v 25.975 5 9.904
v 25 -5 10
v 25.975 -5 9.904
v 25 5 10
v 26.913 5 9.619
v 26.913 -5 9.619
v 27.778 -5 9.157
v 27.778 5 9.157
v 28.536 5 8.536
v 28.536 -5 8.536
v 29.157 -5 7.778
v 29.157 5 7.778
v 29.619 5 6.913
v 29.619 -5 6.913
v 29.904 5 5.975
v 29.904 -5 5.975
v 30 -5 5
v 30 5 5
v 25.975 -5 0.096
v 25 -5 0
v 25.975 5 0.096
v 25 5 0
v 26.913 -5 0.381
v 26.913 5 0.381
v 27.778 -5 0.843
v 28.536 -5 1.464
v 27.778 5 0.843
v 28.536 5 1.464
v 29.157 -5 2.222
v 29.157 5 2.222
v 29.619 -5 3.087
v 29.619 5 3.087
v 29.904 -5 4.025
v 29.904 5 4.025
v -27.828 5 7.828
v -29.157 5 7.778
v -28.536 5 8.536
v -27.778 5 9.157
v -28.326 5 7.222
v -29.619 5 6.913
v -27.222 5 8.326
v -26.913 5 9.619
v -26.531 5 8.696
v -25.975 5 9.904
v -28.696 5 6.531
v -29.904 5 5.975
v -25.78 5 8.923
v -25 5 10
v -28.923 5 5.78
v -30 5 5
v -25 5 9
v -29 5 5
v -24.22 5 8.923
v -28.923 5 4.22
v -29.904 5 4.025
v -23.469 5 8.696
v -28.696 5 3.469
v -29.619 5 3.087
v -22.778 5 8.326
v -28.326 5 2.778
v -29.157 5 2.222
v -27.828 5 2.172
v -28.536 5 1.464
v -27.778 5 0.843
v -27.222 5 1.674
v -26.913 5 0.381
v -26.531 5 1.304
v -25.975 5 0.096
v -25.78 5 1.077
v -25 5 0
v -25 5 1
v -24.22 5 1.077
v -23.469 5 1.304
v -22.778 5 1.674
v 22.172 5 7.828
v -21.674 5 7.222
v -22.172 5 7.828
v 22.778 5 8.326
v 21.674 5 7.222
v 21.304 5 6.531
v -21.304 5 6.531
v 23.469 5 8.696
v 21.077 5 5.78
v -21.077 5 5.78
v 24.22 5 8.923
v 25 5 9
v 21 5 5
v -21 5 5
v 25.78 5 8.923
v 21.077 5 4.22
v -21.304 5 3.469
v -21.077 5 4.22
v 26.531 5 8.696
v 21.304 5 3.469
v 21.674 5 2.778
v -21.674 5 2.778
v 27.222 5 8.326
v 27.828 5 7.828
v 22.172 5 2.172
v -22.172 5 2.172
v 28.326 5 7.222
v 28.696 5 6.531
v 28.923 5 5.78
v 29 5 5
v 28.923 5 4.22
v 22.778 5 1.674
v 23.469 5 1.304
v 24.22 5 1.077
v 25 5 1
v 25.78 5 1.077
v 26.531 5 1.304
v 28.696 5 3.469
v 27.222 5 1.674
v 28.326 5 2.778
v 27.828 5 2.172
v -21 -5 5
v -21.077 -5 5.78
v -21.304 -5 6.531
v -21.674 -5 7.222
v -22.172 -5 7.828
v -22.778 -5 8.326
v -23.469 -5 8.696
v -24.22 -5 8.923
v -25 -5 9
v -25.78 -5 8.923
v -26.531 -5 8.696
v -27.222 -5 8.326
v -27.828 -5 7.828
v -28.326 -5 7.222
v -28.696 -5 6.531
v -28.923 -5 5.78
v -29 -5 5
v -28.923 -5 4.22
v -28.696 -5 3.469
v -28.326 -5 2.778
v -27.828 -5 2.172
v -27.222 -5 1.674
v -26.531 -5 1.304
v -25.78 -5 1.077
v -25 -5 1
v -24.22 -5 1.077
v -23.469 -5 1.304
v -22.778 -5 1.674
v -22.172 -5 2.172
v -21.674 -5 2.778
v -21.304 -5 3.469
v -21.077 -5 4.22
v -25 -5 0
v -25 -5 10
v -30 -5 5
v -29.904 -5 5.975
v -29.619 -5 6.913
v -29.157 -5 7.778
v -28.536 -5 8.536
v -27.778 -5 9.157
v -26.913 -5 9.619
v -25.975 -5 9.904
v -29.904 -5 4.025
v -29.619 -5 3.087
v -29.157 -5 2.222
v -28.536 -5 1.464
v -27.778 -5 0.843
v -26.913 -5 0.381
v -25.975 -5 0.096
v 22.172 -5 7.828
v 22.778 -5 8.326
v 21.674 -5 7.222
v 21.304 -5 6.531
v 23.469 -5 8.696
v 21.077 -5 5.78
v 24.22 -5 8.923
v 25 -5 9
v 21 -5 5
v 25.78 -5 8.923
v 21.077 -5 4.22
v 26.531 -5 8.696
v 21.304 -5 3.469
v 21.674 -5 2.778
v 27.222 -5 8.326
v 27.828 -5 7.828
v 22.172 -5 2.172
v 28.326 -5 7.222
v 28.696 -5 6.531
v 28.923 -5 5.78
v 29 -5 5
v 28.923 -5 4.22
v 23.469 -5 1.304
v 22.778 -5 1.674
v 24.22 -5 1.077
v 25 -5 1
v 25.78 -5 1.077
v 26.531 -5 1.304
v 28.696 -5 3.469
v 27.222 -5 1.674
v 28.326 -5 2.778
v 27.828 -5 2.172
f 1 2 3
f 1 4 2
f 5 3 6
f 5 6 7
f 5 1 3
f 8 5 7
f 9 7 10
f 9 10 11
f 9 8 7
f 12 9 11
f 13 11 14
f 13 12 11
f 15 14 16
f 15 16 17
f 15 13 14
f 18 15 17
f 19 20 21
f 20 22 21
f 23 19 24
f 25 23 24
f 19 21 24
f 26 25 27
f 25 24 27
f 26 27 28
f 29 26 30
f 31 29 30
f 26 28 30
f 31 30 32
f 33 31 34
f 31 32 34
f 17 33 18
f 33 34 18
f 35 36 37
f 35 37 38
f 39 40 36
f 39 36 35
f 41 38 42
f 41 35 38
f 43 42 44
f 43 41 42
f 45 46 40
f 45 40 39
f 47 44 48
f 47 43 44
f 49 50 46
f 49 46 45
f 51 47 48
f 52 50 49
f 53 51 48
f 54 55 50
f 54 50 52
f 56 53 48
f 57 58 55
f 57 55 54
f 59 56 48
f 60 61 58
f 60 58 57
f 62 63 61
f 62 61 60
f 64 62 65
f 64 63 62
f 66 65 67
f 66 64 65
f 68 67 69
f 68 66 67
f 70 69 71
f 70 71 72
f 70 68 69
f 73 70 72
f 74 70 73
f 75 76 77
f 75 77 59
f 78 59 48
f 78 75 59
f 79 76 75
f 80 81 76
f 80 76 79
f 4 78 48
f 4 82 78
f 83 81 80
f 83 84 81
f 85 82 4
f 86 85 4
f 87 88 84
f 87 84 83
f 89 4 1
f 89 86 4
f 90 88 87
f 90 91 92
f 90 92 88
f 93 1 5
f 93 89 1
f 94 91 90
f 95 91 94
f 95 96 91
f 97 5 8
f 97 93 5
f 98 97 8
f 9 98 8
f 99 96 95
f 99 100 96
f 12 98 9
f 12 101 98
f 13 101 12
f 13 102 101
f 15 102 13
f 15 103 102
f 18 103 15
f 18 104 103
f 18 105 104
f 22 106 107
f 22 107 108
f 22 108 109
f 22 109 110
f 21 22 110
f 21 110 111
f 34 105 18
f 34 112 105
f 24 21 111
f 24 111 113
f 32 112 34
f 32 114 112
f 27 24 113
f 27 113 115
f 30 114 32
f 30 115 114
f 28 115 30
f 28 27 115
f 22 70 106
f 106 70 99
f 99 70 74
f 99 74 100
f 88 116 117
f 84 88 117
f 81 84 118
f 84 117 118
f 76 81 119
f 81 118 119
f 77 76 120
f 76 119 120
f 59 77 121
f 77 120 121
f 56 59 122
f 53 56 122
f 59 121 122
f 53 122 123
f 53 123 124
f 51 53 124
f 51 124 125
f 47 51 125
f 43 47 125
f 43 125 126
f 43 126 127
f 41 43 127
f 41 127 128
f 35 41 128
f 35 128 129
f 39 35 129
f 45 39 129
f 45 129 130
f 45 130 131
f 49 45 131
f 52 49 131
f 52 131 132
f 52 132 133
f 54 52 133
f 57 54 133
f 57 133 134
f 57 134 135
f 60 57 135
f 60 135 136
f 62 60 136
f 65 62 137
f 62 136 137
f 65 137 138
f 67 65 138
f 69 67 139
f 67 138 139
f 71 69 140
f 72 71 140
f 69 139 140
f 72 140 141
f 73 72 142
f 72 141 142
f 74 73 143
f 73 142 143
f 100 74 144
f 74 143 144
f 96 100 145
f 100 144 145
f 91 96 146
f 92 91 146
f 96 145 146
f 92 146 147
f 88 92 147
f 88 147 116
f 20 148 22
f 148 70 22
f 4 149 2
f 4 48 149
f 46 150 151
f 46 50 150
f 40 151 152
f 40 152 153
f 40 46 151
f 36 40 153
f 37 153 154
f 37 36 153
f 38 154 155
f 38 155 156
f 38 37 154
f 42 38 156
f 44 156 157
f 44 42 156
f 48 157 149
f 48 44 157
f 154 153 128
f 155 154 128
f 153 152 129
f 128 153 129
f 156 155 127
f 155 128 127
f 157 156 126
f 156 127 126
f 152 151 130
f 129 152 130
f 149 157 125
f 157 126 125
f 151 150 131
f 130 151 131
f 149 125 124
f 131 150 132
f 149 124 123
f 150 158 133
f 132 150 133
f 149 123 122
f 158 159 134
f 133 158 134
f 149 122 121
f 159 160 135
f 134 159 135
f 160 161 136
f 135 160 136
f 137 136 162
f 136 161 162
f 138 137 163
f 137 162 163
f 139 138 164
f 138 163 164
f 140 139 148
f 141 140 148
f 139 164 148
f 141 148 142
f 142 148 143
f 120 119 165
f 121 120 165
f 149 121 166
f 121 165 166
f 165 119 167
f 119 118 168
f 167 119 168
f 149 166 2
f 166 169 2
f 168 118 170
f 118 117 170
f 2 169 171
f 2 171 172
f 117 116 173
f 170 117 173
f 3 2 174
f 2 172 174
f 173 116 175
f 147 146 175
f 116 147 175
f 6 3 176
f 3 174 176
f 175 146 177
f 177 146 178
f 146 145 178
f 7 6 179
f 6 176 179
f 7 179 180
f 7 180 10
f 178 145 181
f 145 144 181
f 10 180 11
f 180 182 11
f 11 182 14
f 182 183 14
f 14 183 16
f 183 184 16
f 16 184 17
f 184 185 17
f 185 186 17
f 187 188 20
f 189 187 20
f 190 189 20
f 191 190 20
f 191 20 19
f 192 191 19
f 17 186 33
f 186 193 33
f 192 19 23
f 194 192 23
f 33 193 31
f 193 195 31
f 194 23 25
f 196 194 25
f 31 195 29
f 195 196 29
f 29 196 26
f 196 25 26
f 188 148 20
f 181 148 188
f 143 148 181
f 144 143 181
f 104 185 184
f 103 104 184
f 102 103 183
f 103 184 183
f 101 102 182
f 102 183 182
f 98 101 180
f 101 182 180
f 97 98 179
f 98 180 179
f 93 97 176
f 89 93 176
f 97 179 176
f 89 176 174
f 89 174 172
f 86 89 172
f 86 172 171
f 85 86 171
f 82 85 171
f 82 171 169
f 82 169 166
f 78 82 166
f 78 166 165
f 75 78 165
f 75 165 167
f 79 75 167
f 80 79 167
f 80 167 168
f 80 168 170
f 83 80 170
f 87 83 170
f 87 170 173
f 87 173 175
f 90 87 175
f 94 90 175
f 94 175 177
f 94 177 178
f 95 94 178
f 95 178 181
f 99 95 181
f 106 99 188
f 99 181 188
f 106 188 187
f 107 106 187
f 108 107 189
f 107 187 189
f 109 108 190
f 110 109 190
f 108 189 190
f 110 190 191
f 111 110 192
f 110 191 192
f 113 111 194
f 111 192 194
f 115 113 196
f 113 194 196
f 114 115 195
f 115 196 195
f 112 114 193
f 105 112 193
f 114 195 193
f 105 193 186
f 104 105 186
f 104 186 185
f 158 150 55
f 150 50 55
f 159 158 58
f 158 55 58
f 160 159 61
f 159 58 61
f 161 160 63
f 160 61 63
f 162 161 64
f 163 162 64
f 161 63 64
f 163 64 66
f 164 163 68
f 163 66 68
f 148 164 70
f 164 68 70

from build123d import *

# Parameters (mm, degrees)
F0_W     = 60
F0_H     = 10
F1_DEPTH = 10
F2_R     = 4
F3_DEPTH = 10.001
F4_R     = 4.99999
F5_R     = 4
F6_DEPTH = 10.001


# Not quite as in the source:
# - a fillet or chamfer is up to 0.001 mm smaller than in the source, because OpenCascade refuses the exact size


with BuildPart() as f1:
    # F0 (on Top) → F1 (new body)
    with BuildSketch(Plane.XY):
        Rectangle(F0_W, F0_H)
    extrude(amount=F1_DEPTH)

    # F2 (on face) → F3 (cut, through all)
    with BuildSketch(Plane.XZ.offset(5)):
        with Locations((-25, 5)):
            Circle(F2_R)
        with Locations((25, 5)):
            Circle(F2_R)
    extrude(amount=-F3_DEPTH, mode=Mode.SUBTRACT)

    # F4 (radius 5 in the source; OpenCascade refuses exactly that, so slightly less here)
    f4_edges = [f1.edges().sort_by_distance(p)[0] for p in [
        (-30, 0, 10),
        (-30, 0, 0),
        (30, 0, 10),
        (30, 0, 0),
    ]]
    fillet(f4_edges, radius=F4_R)

    # F5 (on face) → F6 (cut, through all)
    with BuildSketch(Plane.XZ.offset(5)):
        with Locations((45, 5)):
            Circle(F5_R)
    extrude(amount=-F6_DEPTH, mode=Mode.SUBTRACT)


solid = f1.part
